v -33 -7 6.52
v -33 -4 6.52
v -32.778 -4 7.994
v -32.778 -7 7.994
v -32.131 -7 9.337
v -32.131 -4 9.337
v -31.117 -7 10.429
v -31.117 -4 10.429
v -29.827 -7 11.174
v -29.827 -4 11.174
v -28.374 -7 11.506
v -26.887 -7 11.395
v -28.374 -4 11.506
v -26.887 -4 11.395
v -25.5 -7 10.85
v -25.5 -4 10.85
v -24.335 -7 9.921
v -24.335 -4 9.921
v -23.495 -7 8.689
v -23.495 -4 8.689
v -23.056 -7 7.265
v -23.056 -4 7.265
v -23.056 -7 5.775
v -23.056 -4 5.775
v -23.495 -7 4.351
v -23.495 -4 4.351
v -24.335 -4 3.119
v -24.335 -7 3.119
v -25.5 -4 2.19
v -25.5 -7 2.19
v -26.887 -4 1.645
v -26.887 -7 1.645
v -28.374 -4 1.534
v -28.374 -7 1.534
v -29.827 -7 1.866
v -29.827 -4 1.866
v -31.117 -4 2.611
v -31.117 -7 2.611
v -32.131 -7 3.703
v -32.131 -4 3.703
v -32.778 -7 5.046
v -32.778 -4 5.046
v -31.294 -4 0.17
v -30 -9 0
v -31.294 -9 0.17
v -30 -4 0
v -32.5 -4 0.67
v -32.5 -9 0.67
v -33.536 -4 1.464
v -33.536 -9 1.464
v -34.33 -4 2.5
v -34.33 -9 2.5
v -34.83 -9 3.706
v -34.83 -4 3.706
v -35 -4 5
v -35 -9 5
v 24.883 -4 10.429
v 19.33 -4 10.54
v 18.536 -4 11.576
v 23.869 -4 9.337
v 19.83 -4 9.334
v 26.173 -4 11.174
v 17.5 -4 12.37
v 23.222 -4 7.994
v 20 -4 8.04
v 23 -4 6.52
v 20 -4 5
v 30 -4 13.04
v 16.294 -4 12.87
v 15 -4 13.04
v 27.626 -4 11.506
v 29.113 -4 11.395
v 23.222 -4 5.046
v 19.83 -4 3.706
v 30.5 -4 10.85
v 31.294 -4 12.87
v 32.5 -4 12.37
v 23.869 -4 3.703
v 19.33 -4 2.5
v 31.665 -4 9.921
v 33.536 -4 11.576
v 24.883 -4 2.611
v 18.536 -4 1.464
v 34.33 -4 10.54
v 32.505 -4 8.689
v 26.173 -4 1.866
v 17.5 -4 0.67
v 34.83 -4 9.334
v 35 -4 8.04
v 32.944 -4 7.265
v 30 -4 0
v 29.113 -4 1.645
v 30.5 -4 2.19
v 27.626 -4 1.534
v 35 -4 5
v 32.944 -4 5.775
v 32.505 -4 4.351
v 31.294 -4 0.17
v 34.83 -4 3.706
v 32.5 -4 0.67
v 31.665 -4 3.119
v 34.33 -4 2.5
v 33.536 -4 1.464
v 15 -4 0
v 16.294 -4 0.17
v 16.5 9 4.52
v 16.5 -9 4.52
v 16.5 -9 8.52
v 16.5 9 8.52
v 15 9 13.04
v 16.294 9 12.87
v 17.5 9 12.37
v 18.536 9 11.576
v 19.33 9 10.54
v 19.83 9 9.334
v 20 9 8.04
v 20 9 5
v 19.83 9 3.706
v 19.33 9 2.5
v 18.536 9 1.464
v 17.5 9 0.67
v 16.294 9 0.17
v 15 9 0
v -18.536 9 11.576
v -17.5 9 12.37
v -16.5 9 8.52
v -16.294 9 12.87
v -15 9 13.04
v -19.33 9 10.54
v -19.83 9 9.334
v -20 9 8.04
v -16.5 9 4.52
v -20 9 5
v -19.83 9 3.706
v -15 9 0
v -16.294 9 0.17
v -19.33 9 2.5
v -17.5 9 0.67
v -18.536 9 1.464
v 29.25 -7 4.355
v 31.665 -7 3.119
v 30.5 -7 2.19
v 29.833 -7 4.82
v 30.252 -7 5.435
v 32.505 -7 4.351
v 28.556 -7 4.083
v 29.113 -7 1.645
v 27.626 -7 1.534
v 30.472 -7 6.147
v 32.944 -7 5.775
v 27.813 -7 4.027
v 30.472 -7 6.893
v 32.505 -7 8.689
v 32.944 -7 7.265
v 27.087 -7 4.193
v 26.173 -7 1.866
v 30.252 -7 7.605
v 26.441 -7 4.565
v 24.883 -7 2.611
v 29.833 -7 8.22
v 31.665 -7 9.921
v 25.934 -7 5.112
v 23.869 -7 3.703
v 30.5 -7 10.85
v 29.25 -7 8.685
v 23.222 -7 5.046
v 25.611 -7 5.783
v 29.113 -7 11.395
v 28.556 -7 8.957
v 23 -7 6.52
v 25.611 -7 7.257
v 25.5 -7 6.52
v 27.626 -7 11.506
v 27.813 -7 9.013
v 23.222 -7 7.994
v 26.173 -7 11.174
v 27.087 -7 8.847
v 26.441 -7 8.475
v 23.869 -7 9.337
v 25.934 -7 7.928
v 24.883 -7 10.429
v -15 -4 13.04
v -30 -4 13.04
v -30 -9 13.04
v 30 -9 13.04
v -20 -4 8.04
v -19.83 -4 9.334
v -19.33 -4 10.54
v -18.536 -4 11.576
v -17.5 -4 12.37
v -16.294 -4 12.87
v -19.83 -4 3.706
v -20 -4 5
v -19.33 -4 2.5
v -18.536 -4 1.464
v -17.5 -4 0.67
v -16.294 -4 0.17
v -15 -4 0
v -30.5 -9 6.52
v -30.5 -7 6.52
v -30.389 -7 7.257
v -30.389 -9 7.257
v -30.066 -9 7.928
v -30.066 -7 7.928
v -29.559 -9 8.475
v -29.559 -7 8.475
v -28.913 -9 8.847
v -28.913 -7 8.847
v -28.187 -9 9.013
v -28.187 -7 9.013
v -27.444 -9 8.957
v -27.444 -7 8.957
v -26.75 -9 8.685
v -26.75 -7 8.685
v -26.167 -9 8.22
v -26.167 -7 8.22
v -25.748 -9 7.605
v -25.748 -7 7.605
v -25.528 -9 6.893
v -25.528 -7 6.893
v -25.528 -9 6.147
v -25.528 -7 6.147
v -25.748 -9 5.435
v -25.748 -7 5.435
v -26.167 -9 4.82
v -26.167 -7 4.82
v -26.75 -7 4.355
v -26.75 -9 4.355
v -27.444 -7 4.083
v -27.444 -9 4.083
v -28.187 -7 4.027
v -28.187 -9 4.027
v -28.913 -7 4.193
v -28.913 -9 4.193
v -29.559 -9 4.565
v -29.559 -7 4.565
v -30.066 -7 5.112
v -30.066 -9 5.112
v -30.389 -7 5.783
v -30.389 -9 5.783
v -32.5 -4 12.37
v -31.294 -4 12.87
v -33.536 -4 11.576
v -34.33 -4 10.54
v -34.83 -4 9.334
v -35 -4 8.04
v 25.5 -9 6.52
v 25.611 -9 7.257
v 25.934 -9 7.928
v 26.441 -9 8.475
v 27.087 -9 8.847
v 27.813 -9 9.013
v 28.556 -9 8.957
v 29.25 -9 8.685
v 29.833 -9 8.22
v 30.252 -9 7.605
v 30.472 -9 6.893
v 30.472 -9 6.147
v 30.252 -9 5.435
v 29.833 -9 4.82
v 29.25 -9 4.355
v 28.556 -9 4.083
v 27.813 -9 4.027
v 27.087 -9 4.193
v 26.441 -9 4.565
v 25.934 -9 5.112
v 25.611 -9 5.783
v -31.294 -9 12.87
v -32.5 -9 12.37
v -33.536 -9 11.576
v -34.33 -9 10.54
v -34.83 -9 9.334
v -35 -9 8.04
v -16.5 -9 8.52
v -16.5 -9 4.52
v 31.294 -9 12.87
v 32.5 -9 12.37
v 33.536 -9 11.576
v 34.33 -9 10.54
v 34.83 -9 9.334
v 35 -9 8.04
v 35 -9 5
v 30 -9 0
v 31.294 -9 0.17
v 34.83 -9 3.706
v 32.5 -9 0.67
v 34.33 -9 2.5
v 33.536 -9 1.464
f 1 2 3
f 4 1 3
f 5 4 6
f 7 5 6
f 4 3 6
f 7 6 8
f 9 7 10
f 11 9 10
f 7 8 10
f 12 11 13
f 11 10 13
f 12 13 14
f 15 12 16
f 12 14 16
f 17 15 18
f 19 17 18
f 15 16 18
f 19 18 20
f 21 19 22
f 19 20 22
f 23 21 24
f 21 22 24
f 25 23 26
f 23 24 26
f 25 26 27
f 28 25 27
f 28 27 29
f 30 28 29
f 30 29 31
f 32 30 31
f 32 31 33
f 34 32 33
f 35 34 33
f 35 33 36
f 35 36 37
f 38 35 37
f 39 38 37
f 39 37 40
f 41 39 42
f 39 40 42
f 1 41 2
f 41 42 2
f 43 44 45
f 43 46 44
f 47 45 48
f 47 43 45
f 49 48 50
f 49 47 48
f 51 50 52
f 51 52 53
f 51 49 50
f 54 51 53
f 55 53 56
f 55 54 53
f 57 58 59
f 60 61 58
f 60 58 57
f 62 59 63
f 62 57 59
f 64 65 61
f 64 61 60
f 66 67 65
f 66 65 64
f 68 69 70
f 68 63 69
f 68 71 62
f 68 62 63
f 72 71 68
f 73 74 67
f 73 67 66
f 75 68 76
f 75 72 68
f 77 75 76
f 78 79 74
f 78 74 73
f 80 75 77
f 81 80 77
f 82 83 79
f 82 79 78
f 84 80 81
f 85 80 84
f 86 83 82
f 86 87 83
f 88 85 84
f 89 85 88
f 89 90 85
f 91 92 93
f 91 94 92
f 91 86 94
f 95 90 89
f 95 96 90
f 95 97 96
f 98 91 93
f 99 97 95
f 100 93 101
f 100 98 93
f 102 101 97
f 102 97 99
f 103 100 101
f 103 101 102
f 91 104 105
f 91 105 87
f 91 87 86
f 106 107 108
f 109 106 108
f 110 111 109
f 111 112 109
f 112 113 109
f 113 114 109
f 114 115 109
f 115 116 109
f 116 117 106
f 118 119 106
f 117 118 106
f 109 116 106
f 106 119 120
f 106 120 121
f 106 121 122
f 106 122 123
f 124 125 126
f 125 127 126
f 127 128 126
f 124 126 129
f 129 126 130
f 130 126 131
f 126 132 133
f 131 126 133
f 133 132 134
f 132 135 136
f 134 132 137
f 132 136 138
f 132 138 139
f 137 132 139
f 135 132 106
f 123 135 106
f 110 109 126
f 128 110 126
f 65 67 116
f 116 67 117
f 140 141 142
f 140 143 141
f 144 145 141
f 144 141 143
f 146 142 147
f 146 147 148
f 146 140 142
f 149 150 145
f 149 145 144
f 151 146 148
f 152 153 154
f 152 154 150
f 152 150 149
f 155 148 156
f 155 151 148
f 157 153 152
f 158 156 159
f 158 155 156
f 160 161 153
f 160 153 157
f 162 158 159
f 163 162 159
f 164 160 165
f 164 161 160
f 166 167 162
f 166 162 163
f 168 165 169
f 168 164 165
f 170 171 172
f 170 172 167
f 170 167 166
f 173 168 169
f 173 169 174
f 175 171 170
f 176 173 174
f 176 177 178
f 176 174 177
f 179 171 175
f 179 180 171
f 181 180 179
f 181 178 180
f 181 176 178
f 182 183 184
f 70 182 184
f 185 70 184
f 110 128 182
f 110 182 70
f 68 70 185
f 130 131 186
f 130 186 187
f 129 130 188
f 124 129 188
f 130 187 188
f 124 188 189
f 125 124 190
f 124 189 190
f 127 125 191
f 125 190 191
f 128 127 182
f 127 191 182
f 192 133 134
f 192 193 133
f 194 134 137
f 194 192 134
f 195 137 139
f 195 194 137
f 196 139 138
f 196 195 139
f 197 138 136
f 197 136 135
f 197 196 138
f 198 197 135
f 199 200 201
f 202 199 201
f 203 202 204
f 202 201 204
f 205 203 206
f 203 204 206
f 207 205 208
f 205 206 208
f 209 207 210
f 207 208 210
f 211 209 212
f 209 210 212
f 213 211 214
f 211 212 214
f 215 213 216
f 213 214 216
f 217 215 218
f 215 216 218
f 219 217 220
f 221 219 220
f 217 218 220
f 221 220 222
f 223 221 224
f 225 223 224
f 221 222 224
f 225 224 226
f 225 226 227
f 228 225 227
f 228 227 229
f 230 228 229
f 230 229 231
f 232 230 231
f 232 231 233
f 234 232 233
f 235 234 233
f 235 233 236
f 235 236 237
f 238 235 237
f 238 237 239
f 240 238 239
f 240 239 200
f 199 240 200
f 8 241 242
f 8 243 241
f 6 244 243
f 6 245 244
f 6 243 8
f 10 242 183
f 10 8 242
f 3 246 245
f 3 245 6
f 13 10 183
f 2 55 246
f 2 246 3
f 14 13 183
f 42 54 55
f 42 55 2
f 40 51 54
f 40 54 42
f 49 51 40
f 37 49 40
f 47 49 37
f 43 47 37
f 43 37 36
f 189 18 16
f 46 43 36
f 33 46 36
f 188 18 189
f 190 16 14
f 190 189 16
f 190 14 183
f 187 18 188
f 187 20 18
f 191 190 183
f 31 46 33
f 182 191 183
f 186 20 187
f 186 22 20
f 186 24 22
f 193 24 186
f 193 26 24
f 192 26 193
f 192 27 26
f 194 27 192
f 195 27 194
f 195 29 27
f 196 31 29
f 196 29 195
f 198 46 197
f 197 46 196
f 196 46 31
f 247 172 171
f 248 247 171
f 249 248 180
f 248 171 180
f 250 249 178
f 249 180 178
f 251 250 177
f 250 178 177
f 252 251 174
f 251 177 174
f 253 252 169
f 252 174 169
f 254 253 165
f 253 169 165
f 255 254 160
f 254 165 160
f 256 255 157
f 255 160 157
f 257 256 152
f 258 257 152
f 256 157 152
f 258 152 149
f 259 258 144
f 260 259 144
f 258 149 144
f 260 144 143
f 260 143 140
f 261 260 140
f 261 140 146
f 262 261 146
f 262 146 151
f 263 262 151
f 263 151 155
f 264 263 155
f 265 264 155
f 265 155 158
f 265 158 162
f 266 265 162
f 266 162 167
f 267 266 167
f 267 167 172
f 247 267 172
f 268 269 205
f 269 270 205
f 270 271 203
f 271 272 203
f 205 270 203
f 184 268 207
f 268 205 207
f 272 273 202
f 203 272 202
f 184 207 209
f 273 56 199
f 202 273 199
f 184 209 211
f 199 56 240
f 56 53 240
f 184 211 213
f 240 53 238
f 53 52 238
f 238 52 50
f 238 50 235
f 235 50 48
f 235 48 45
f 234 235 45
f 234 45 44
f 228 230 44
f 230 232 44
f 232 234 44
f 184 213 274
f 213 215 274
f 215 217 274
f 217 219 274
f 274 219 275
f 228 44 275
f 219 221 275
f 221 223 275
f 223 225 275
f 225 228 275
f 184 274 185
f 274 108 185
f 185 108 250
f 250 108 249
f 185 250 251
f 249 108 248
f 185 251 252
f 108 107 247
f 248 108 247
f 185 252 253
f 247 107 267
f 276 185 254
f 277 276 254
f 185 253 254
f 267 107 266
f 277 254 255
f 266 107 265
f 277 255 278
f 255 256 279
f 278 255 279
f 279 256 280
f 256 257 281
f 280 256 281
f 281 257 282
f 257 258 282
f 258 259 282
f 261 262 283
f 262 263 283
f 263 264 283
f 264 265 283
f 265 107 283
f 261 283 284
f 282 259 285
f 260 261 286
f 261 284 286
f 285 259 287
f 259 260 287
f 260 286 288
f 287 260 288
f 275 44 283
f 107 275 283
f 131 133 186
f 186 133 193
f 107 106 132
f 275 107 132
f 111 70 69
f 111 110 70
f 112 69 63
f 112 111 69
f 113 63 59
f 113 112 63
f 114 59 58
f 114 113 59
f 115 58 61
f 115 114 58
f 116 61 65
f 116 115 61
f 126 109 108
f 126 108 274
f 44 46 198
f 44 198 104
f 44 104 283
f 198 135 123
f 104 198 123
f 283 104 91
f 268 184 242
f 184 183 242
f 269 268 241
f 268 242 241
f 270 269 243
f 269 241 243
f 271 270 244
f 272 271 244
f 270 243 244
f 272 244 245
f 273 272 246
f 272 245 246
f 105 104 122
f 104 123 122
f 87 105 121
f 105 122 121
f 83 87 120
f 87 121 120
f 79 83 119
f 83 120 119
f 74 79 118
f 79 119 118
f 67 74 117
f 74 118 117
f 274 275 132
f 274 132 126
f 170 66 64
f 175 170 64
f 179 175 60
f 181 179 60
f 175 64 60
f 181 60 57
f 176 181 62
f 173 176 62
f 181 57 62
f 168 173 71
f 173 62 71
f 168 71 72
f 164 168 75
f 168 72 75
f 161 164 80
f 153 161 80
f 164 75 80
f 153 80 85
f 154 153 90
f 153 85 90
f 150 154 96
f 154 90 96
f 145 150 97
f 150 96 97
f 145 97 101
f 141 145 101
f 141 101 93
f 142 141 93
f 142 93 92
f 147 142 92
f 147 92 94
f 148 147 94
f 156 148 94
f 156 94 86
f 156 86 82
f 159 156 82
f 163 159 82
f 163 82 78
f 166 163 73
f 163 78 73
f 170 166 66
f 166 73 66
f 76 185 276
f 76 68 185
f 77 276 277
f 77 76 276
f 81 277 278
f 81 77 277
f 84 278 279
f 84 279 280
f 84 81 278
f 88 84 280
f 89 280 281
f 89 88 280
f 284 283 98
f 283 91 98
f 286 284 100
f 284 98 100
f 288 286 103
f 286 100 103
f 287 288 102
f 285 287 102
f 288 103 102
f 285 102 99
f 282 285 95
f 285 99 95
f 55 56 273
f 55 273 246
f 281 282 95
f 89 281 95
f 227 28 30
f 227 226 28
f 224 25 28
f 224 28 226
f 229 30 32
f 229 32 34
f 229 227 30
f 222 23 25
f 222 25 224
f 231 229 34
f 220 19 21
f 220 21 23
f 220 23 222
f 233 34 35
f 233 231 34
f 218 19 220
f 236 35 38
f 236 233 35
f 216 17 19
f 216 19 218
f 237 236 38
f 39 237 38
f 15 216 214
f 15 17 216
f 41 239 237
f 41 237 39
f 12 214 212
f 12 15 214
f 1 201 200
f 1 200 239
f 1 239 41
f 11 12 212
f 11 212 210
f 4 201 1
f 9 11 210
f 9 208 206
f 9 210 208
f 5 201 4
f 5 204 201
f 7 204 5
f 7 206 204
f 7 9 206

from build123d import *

# Parameters (mm, degrees)
F0_W     = 33
F0_H     = 13
F0_W_2   = 3.5
F0_H_2   = 5
F0_W_3   = 15
F1_DEPTH = 13.04
F2_W     = 33
F2_H     = 4
F3_DEPTH = 40.6
F4_R     = 2.5
F5_R     = 2.5
F6_DEPTH = 9.9
F4_R_2   = 5
F5_R_2   = 5
F7_DEPTH = 3
F8_R     = 5


with BuildPart() as f1:
    # F0 (on Top) → F1 (new body)
    with BuildSketch(Plane.XY):
        with Locations((0, 2.5)):
            Rectangle(F0_W, F0_H)
        with Locations((-18.25, 2.5)):
            Rectangle(F0_W_2, F0_H)
        Polygon((16.5, -4), (-16.5, -4), (-16.5, -9), (0, -9), (16.5, -9), align=None)
        with Locations((-18.25, -6.5)):
            Rectangle(F0_W_2, F0_H_2)
        with Locations((-27.5, -6.5)):
            Rectangle(F0_W_3, F0_H_2)
        with Locations((18.25, 2.5)):
            Rectangle(F0_W_2, F0_H)
        with Locations((18.25, -6.5)):
            Rectangle(F0_W_2, F0_H_2)
        with Locations((27.5, -6.5)):
            Rectangle(F0_W_3, F0_H_2)
    extrude(amount=F1_DEPTH)

    # F2 (on face) → F3 (cut)
    with BuildSketch(Plane(origin=(0, 9, 0), x_dir=(-1, 0, 0), z_dir=(0, 1, 0))):
        with Locations((0, 6.52)):
            Rectangle(F2_W, F2_H)
    extrude(amount=-F3_DEPTH, mode=Mode.SUBTRACT)

    # F4 (on face) + F5 (on face) → F6 (cut)
    with BuildSketch(Plane(origin=(0, -4, 0), x_dir=(-1, 0, 0), z_dir=(0, 1, 0))):
        with Locations((-28, 6.52)):
            Circle(F4_R)
    with BuildSketch(Plane(origin=(0, -4, 0), x_dir=(-1, 0, 0), z_dir=(0, 1, 0))):
        with Locations((28, 6.52)):
            Circle(F5_R)
    extrude(amount=-F6_DEPTH, mode=Mode.SUBTRACT)

    # F4 (on face) + F5 (on face) → F7 (cut)
    with BuildSketch(Plane(origin=(0, -4, 0), x_dir=(-1, 0, 0), z_dir=(0, 1, 0))):
        with Locations((-28, 6.52)):
            Circle(F4_R_2)
        with Locations((-28, 6.52)):
            Circle(F4_R, mode=Mode.SUBTRACT)
    with BuildSketch(Plane(origin=(0, -4, 0), x_dir=(-1, 0, 0), z_dir=(0, 1, 0))):
        with Locations((28, 6.52)):
            Circle(F5_R_2)
        with Locations((28, 6.52)):
            Circle(F5_R, mode=Mode.SUBTRACT)
    extrude(amount=-F7_DEPTH, mode=Mode.SUBTRACT)

    # F8
    f8_edges = [f1.edges().sort_by_distance(p)[0] for p in [
        (35, -6.5, 13.04),
        (35, -6.5, 0),
        (-35, -6.5, 13.04),
        (-35, -6.5, 0),
        (20, 2.5, 13.04),
        (-20, 2.5, 13.04),
        (-20, 2.5, 0),
        (20, 2.5, 0),
    ]]
    fillet(f8_edges, radius=F8_R)


solid = f1.part
